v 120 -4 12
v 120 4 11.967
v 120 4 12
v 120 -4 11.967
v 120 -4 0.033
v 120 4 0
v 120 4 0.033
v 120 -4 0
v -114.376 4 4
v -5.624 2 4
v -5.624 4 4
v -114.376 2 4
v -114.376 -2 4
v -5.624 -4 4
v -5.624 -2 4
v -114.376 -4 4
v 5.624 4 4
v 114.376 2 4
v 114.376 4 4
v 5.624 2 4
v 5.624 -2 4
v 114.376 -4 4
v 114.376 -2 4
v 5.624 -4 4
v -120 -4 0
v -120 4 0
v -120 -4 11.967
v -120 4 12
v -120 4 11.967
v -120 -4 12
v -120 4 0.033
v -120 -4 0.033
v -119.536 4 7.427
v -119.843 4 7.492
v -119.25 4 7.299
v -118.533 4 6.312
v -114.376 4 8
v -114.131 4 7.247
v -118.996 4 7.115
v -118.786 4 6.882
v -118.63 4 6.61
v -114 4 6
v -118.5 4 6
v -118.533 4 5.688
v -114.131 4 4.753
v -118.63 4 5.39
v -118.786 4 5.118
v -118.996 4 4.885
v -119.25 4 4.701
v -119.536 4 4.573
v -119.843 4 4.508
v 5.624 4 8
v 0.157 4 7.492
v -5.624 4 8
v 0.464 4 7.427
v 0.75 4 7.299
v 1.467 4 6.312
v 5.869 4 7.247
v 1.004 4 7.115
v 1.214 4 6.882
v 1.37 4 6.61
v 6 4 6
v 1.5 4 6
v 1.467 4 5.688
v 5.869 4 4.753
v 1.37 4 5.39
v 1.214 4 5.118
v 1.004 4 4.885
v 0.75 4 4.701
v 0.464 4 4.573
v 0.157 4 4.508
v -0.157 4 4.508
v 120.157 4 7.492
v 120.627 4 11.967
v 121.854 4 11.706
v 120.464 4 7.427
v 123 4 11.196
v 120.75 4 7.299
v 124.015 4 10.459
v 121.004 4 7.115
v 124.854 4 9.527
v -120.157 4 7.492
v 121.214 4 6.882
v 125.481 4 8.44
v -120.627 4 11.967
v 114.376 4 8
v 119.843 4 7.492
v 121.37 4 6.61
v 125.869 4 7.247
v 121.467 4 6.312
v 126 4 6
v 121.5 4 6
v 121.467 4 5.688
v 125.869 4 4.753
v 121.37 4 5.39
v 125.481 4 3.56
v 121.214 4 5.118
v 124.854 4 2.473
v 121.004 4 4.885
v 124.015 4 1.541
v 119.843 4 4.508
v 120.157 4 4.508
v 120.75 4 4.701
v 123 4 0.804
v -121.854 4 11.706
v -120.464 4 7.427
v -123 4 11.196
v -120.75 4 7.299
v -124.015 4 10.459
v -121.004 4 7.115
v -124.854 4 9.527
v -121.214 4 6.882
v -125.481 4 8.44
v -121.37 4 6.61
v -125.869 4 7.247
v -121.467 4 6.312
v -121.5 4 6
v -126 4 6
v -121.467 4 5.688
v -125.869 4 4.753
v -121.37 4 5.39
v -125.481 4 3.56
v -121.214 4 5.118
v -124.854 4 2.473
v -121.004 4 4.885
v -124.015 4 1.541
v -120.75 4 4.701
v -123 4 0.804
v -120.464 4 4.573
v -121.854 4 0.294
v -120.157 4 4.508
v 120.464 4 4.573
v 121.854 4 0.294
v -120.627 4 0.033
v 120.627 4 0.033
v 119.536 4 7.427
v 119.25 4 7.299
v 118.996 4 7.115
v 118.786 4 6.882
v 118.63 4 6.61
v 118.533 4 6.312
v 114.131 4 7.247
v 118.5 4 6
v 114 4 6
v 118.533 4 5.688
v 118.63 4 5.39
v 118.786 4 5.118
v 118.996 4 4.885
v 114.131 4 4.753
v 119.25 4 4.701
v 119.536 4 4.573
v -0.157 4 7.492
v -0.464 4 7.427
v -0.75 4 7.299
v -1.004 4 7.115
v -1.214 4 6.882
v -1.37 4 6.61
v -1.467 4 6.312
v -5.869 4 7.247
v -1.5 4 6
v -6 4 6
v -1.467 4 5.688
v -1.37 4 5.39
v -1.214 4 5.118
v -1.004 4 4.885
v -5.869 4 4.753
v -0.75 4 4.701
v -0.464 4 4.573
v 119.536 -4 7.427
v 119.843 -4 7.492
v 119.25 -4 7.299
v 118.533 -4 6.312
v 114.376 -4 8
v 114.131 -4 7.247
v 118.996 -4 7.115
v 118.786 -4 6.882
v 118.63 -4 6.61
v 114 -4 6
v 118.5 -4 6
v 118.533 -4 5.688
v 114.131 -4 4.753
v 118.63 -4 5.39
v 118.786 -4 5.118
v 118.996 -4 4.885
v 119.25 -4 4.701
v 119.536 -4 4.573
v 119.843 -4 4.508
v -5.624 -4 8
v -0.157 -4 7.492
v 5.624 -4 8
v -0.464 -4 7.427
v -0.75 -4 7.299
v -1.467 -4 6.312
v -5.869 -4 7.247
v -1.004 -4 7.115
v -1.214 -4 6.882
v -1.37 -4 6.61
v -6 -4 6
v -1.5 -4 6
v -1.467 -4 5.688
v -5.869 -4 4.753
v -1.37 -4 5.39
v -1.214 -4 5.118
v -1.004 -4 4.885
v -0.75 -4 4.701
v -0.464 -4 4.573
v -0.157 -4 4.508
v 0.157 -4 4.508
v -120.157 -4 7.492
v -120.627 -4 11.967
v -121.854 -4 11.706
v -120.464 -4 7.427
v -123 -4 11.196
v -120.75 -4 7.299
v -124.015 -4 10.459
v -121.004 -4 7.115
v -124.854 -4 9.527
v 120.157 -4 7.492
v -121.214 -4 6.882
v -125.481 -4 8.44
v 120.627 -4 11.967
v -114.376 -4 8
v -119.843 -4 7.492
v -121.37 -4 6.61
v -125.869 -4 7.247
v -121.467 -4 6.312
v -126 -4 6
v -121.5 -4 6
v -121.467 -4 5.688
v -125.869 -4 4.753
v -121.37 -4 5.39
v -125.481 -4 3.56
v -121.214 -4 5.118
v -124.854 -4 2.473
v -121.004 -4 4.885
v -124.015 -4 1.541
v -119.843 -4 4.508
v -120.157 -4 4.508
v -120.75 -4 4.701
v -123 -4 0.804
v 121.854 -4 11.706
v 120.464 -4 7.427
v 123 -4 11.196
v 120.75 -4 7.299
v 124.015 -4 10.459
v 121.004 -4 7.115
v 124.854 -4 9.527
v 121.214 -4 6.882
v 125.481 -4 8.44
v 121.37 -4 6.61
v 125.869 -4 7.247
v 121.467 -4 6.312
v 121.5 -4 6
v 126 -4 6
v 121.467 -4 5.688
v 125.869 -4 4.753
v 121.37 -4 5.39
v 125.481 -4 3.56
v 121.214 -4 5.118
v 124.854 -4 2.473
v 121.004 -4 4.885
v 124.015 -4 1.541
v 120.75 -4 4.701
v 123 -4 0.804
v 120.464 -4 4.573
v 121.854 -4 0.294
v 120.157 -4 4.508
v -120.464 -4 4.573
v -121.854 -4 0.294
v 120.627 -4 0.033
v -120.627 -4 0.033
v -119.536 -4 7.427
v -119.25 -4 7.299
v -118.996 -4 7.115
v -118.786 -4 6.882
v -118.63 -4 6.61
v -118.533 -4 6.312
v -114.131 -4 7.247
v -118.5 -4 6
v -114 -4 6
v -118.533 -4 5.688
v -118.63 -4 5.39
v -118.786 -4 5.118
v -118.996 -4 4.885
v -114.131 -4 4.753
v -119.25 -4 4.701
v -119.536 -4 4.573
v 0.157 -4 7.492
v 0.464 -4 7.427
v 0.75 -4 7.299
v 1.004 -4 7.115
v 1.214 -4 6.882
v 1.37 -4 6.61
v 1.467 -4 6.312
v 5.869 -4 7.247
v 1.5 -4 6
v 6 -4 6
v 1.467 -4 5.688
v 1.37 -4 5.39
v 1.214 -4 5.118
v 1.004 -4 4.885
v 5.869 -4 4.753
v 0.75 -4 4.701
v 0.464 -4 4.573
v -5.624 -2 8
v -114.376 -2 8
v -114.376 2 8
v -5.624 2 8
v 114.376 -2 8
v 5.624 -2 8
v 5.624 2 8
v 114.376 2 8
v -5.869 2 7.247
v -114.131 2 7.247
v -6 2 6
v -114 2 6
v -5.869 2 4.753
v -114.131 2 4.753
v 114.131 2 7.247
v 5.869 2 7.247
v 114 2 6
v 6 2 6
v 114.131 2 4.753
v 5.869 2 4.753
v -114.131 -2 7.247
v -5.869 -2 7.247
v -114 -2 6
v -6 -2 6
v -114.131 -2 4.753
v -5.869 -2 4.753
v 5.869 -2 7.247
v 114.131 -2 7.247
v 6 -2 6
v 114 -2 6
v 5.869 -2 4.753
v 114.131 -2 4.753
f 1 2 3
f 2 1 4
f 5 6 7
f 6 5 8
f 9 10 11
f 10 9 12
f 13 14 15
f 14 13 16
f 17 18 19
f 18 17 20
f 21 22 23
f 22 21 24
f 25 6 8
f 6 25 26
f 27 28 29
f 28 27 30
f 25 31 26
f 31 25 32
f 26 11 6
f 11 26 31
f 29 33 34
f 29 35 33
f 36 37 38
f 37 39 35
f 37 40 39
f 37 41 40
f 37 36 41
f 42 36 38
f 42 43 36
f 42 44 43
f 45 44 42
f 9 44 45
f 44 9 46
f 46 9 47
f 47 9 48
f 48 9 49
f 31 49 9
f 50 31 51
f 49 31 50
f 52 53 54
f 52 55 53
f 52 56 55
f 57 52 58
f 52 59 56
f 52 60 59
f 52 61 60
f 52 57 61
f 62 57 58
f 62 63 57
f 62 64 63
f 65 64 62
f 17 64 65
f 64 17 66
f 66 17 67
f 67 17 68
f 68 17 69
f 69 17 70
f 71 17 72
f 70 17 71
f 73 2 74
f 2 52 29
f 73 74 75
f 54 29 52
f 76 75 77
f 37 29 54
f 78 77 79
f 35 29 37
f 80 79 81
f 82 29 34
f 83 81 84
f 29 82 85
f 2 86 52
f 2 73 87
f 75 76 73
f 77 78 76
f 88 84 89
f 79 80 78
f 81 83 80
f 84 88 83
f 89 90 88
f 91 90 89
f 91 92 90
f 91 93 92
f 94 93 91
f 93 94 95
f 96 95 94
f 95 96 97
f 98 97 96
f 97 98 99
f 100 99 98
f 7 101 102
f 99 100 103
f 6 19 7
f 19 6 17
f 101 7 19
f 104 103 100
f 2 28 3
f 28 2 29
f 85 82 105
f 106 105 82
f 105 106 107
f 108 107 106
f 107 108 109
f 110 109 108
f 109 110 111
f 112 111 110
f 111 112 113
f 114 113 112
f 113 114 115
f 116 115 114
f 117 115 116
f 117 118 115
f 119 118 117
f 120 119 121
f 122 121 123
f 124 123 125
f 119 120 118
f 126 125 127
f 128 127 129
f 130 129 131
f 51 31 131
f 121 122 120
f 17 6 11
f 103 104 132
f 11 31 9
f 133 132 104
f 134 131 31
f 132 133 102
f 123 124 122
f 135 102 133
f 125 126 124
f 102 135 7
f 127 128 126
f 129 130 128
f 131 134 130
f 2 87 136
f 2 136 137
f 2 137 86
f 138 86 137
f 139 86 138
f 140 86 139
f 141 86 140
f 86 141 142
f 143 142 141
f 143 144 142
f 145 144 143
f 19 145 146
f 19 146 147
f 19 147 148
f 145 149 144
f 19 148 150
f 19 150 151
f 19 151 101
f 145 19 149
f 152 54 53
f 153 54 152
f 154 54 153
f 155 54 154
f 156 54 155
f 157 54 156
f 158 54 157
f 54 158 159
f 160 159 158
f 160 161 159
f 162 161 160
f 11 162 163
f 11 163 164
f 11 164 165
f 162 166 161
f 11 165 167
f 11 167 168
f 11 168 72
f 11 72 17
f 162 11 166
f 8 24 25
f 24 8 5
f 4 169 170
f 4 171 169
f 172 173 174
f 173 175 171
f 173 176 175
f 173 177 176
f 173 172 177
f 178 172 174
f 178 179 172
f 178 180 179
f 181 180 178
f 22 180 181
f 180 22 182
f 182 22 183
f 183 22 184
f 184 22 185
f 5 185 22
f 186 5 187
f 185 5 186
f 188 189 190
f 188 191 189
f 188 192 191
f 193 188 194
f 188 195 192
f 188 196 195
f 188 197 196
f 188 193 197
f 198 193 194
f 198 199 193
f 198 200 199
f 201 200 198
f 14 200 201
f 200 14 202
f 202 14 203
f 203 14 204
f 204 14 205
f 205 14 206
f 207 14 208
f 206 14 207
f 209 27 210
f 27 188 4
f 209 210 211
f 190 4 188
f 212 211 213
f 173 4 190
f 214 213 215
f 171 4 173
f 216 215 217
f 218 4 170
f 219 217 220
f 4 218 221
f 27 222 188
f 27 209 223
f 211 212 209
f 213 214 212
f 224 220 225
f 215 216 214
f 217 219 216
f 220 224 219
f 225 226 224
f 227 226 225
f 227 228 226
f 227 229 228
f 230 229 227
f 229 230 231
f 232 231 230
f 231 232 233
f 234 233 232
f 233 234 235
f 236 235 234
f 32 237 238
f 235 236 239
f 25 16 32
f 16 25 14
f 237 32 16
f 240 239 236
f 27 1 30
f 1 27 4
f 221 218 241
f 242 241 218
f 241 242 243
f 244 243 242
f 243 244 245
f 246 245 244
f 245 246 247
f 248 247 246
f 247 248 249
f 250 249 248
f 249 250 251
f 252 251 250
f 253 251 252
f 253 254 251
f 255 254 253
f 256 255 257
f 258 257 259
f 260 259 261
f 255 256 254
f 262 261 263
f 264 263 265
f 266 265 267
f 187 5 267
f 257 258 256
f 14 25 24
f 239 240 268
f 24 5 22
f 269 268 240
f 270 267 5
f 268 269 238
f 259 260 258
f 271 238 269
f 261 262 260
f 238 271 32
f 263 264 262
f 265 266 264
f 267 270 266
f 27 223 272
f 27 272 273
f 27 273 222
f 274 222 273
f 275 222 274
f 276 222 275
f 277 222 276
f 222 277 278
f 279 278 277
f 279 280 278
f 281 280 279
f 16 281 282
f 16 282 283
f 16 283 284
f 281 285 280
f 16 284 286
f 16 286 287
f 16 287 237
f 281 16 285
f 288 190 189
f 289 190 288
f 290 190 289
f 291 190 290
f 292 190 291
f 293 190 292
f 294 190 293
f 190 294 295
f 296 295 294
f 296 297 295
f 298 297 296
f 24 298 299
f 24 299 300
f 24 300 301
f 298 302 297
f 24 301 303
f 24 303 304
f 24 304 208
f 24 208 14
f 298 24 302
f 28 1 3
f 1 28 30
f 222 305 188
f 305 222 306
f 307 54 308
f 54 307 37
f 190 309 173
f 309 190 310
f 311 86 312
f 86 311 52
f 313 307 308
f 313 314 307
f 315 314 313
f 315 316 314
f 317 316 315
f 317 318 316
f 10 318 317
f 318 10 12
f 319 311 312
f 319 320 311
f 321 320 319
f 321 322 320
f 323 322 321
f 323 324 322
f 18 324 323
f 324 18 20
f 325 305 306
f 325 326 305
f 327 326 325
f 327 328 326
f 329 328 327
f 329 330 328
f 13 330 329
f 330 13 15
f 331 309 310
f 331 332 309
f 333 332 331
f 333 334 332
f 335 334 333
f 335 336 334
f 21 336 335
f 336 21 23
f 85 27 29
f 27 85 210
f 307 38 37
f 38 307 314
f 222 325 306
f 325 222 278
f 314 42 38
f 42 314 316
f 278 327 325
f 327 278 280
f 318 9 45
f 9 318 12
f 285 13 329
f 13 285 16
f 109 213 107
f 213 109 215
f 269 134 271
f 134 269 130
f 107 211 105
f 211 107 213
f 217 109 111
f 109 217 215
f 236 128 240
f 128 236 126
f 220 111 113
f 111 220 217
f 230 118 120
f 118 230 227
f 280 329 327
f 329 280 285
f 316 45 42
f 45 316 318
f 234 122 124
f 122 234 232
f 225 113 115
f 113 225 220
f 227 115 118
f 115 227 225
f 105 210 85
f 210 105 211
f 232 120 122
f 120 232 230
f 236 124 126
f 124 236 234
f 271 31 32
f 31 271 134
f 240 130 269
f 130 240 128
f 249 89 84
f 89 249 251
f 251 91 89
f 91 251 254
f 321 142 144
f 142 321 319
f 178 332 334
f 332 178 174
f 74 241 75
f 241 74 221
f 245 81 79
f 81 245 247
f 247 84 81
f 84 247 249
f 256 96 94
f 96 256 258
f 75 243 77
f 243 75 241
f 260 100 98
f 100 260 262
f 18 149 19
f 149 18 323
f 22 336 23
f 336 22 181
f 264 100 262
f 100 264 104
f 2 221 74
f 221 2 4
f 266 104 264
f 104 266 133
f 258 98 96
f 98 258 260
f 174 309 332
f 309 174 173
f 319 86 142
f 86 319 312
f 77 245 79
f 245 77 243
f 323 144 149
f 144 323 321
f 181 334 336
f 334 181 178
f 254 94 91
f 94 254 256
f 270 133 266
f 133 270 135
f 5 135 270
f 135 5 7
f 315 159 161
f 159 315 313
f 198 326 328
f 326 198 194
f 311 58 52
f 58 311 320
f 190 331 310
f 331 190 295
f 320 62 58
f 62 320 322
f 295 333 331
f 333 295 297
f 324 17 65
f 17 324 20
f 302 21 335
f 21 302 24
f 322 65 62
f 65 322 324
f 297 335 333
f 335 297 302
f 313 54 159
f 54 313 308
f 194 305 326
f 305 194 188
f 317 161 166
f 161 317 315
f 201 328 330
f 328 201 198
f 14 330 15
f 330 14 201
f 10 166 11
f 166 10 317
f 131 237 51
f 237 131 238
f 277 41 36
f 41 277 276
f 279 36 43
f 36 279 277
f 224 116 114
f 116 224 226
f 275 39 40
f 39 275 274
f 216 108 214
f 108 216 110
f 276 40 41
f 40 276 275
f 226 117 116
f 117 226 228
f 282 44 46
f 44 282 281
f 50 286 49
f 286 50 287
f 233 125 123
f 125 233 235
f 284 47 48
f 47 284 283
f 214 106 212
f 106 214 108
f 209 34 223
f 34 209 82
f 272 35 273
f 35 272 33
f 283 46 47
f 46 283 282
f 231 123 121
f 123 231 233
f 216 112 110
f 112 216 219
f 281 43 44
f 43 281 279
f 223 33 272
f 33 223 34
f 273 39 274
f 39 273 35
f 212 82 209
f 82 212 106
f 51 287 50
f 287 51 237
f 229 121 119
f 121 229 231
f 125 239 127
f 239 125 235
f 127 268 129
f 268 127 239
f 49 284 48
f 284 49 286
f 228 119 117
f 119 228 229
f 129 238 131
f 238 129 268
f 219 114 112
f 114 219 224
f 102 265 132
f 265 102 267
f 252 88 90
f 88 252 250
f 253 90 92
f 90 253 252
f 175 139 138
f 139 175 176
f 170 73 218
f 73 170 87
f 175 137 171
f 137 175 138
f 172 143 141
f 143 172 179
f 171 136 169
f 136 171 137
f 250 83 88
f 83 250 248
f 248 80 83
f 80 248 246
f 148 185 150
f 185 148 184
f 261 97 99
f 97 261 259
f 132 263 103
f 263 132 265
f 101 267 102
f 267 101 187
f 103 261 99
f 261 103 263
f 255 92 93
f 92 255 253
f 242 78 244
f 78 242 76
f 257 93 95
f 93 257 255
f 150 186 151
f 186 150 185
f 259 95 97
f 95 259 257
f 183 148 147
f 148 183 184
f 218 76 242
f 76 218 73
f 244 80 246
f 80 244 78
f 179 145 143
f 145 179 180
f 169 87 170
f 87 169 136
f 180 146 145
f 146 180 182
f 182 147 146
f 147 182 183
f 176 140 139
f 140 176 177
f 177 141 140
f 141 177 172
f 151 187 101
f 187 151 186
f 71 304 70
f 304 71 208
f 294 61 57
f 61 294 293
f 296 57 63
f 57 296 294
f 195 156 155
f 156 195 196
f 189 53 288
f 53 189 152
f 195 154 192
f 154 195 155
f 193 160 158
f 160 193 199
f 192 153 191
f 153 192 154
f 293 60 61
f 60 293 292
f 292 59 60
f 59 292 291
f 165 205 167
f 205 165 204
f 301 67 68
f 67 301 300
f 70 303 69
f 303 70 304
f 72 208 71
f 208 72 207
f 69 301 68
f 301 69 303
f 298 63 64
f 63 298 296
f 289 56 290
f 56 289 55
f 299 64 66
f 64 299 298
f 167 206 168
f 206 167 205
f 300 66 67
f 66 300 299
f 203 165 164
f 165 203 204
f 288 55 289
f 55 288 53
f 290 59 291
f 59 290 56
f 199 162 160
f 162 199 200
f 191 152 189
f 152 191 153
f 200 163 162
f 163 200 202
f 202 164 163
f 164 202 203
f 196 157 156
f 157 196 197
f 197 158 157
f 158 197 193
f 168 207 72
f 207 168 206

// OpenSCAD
/*
Robot scissor lift components for FTC Team #11587
10 inch Scissor Lift Arm
Kurt Kochendarfer
January 2017
*/

/*Initial scissor lift arm design.  Dimensionally restricted to 10" for printing on a 3D print bed.*/


module makeLowerFlange() {
    color("black",0.75) {
        cube(size=[240,8,4], center = true);
    }
}

module makeUpperFlange() {
    color("black",0.75) {
        translate ([0,0,8])
            cube(size=[240,8,4], center = true);
    }
}

module makeWeb() {
    color("black",0.75) {
        translate([0,0,4])
            cube(size=[240,4,8], center = true);
    }
}

module makeLHole() {
    color("blue",0.75) {
        translate([-120,0,4])
            rotate([90,0,0]) {
                cylinder (h=10,d=3,center=true,$fn=30);
            }
    }
}

module makeRHole() {
    color("blue",0.75) {
        translate([120,0,4])
            rotate([90,0,0]) {
                cylinder (h=10,d=3,center=true,$fn=30);
            }
            
    }
}

module makeMiddleHole() {
    color("blue",0.75) {
        translate([0,0,4])
            rotate([90,0,0]) {
                cylinder (h=10,d=3,center=true,$fn=30);
            }
    }
}
    
module makeRoundLEnd() {
    color("black",0.75) {
        translate([-120,0,4])
            rotate([90,0,0]) {
                cylinder (h=8,d=12,center=true,$fn=30);
            }
    }
}

module makeRoundREnd() {
    color("black",0.75) {
        translate([120,0,4])
            rotate([90,0,0]) {
                cylinder (h=8,d=12,center=true,$fn=30);
            }
            
        }    
}

module makeRoundMiddle() {
    color("black",0.75) {
        translate([0,0,4])
            rotate([90,0,0]) {
                cylinder (h=8,d=12,center=true,$fn=30);
            }
    }
}


module makeIBeam() {
    makeLowerFlange();
    makeUpperFlange();
    makeWeb();
    makeRoundLEnd();
    makeRoundREnd();
    makeRoundMiddle();
}

module makeHoles() {
    makeLHole();
    makeRHole();
    makeMiddleHole();
}

module makeObject() {
    difference() {
        makeIBeam();
        makeHoles();
    }
}

translate([0,0,2])
    makeObject();
